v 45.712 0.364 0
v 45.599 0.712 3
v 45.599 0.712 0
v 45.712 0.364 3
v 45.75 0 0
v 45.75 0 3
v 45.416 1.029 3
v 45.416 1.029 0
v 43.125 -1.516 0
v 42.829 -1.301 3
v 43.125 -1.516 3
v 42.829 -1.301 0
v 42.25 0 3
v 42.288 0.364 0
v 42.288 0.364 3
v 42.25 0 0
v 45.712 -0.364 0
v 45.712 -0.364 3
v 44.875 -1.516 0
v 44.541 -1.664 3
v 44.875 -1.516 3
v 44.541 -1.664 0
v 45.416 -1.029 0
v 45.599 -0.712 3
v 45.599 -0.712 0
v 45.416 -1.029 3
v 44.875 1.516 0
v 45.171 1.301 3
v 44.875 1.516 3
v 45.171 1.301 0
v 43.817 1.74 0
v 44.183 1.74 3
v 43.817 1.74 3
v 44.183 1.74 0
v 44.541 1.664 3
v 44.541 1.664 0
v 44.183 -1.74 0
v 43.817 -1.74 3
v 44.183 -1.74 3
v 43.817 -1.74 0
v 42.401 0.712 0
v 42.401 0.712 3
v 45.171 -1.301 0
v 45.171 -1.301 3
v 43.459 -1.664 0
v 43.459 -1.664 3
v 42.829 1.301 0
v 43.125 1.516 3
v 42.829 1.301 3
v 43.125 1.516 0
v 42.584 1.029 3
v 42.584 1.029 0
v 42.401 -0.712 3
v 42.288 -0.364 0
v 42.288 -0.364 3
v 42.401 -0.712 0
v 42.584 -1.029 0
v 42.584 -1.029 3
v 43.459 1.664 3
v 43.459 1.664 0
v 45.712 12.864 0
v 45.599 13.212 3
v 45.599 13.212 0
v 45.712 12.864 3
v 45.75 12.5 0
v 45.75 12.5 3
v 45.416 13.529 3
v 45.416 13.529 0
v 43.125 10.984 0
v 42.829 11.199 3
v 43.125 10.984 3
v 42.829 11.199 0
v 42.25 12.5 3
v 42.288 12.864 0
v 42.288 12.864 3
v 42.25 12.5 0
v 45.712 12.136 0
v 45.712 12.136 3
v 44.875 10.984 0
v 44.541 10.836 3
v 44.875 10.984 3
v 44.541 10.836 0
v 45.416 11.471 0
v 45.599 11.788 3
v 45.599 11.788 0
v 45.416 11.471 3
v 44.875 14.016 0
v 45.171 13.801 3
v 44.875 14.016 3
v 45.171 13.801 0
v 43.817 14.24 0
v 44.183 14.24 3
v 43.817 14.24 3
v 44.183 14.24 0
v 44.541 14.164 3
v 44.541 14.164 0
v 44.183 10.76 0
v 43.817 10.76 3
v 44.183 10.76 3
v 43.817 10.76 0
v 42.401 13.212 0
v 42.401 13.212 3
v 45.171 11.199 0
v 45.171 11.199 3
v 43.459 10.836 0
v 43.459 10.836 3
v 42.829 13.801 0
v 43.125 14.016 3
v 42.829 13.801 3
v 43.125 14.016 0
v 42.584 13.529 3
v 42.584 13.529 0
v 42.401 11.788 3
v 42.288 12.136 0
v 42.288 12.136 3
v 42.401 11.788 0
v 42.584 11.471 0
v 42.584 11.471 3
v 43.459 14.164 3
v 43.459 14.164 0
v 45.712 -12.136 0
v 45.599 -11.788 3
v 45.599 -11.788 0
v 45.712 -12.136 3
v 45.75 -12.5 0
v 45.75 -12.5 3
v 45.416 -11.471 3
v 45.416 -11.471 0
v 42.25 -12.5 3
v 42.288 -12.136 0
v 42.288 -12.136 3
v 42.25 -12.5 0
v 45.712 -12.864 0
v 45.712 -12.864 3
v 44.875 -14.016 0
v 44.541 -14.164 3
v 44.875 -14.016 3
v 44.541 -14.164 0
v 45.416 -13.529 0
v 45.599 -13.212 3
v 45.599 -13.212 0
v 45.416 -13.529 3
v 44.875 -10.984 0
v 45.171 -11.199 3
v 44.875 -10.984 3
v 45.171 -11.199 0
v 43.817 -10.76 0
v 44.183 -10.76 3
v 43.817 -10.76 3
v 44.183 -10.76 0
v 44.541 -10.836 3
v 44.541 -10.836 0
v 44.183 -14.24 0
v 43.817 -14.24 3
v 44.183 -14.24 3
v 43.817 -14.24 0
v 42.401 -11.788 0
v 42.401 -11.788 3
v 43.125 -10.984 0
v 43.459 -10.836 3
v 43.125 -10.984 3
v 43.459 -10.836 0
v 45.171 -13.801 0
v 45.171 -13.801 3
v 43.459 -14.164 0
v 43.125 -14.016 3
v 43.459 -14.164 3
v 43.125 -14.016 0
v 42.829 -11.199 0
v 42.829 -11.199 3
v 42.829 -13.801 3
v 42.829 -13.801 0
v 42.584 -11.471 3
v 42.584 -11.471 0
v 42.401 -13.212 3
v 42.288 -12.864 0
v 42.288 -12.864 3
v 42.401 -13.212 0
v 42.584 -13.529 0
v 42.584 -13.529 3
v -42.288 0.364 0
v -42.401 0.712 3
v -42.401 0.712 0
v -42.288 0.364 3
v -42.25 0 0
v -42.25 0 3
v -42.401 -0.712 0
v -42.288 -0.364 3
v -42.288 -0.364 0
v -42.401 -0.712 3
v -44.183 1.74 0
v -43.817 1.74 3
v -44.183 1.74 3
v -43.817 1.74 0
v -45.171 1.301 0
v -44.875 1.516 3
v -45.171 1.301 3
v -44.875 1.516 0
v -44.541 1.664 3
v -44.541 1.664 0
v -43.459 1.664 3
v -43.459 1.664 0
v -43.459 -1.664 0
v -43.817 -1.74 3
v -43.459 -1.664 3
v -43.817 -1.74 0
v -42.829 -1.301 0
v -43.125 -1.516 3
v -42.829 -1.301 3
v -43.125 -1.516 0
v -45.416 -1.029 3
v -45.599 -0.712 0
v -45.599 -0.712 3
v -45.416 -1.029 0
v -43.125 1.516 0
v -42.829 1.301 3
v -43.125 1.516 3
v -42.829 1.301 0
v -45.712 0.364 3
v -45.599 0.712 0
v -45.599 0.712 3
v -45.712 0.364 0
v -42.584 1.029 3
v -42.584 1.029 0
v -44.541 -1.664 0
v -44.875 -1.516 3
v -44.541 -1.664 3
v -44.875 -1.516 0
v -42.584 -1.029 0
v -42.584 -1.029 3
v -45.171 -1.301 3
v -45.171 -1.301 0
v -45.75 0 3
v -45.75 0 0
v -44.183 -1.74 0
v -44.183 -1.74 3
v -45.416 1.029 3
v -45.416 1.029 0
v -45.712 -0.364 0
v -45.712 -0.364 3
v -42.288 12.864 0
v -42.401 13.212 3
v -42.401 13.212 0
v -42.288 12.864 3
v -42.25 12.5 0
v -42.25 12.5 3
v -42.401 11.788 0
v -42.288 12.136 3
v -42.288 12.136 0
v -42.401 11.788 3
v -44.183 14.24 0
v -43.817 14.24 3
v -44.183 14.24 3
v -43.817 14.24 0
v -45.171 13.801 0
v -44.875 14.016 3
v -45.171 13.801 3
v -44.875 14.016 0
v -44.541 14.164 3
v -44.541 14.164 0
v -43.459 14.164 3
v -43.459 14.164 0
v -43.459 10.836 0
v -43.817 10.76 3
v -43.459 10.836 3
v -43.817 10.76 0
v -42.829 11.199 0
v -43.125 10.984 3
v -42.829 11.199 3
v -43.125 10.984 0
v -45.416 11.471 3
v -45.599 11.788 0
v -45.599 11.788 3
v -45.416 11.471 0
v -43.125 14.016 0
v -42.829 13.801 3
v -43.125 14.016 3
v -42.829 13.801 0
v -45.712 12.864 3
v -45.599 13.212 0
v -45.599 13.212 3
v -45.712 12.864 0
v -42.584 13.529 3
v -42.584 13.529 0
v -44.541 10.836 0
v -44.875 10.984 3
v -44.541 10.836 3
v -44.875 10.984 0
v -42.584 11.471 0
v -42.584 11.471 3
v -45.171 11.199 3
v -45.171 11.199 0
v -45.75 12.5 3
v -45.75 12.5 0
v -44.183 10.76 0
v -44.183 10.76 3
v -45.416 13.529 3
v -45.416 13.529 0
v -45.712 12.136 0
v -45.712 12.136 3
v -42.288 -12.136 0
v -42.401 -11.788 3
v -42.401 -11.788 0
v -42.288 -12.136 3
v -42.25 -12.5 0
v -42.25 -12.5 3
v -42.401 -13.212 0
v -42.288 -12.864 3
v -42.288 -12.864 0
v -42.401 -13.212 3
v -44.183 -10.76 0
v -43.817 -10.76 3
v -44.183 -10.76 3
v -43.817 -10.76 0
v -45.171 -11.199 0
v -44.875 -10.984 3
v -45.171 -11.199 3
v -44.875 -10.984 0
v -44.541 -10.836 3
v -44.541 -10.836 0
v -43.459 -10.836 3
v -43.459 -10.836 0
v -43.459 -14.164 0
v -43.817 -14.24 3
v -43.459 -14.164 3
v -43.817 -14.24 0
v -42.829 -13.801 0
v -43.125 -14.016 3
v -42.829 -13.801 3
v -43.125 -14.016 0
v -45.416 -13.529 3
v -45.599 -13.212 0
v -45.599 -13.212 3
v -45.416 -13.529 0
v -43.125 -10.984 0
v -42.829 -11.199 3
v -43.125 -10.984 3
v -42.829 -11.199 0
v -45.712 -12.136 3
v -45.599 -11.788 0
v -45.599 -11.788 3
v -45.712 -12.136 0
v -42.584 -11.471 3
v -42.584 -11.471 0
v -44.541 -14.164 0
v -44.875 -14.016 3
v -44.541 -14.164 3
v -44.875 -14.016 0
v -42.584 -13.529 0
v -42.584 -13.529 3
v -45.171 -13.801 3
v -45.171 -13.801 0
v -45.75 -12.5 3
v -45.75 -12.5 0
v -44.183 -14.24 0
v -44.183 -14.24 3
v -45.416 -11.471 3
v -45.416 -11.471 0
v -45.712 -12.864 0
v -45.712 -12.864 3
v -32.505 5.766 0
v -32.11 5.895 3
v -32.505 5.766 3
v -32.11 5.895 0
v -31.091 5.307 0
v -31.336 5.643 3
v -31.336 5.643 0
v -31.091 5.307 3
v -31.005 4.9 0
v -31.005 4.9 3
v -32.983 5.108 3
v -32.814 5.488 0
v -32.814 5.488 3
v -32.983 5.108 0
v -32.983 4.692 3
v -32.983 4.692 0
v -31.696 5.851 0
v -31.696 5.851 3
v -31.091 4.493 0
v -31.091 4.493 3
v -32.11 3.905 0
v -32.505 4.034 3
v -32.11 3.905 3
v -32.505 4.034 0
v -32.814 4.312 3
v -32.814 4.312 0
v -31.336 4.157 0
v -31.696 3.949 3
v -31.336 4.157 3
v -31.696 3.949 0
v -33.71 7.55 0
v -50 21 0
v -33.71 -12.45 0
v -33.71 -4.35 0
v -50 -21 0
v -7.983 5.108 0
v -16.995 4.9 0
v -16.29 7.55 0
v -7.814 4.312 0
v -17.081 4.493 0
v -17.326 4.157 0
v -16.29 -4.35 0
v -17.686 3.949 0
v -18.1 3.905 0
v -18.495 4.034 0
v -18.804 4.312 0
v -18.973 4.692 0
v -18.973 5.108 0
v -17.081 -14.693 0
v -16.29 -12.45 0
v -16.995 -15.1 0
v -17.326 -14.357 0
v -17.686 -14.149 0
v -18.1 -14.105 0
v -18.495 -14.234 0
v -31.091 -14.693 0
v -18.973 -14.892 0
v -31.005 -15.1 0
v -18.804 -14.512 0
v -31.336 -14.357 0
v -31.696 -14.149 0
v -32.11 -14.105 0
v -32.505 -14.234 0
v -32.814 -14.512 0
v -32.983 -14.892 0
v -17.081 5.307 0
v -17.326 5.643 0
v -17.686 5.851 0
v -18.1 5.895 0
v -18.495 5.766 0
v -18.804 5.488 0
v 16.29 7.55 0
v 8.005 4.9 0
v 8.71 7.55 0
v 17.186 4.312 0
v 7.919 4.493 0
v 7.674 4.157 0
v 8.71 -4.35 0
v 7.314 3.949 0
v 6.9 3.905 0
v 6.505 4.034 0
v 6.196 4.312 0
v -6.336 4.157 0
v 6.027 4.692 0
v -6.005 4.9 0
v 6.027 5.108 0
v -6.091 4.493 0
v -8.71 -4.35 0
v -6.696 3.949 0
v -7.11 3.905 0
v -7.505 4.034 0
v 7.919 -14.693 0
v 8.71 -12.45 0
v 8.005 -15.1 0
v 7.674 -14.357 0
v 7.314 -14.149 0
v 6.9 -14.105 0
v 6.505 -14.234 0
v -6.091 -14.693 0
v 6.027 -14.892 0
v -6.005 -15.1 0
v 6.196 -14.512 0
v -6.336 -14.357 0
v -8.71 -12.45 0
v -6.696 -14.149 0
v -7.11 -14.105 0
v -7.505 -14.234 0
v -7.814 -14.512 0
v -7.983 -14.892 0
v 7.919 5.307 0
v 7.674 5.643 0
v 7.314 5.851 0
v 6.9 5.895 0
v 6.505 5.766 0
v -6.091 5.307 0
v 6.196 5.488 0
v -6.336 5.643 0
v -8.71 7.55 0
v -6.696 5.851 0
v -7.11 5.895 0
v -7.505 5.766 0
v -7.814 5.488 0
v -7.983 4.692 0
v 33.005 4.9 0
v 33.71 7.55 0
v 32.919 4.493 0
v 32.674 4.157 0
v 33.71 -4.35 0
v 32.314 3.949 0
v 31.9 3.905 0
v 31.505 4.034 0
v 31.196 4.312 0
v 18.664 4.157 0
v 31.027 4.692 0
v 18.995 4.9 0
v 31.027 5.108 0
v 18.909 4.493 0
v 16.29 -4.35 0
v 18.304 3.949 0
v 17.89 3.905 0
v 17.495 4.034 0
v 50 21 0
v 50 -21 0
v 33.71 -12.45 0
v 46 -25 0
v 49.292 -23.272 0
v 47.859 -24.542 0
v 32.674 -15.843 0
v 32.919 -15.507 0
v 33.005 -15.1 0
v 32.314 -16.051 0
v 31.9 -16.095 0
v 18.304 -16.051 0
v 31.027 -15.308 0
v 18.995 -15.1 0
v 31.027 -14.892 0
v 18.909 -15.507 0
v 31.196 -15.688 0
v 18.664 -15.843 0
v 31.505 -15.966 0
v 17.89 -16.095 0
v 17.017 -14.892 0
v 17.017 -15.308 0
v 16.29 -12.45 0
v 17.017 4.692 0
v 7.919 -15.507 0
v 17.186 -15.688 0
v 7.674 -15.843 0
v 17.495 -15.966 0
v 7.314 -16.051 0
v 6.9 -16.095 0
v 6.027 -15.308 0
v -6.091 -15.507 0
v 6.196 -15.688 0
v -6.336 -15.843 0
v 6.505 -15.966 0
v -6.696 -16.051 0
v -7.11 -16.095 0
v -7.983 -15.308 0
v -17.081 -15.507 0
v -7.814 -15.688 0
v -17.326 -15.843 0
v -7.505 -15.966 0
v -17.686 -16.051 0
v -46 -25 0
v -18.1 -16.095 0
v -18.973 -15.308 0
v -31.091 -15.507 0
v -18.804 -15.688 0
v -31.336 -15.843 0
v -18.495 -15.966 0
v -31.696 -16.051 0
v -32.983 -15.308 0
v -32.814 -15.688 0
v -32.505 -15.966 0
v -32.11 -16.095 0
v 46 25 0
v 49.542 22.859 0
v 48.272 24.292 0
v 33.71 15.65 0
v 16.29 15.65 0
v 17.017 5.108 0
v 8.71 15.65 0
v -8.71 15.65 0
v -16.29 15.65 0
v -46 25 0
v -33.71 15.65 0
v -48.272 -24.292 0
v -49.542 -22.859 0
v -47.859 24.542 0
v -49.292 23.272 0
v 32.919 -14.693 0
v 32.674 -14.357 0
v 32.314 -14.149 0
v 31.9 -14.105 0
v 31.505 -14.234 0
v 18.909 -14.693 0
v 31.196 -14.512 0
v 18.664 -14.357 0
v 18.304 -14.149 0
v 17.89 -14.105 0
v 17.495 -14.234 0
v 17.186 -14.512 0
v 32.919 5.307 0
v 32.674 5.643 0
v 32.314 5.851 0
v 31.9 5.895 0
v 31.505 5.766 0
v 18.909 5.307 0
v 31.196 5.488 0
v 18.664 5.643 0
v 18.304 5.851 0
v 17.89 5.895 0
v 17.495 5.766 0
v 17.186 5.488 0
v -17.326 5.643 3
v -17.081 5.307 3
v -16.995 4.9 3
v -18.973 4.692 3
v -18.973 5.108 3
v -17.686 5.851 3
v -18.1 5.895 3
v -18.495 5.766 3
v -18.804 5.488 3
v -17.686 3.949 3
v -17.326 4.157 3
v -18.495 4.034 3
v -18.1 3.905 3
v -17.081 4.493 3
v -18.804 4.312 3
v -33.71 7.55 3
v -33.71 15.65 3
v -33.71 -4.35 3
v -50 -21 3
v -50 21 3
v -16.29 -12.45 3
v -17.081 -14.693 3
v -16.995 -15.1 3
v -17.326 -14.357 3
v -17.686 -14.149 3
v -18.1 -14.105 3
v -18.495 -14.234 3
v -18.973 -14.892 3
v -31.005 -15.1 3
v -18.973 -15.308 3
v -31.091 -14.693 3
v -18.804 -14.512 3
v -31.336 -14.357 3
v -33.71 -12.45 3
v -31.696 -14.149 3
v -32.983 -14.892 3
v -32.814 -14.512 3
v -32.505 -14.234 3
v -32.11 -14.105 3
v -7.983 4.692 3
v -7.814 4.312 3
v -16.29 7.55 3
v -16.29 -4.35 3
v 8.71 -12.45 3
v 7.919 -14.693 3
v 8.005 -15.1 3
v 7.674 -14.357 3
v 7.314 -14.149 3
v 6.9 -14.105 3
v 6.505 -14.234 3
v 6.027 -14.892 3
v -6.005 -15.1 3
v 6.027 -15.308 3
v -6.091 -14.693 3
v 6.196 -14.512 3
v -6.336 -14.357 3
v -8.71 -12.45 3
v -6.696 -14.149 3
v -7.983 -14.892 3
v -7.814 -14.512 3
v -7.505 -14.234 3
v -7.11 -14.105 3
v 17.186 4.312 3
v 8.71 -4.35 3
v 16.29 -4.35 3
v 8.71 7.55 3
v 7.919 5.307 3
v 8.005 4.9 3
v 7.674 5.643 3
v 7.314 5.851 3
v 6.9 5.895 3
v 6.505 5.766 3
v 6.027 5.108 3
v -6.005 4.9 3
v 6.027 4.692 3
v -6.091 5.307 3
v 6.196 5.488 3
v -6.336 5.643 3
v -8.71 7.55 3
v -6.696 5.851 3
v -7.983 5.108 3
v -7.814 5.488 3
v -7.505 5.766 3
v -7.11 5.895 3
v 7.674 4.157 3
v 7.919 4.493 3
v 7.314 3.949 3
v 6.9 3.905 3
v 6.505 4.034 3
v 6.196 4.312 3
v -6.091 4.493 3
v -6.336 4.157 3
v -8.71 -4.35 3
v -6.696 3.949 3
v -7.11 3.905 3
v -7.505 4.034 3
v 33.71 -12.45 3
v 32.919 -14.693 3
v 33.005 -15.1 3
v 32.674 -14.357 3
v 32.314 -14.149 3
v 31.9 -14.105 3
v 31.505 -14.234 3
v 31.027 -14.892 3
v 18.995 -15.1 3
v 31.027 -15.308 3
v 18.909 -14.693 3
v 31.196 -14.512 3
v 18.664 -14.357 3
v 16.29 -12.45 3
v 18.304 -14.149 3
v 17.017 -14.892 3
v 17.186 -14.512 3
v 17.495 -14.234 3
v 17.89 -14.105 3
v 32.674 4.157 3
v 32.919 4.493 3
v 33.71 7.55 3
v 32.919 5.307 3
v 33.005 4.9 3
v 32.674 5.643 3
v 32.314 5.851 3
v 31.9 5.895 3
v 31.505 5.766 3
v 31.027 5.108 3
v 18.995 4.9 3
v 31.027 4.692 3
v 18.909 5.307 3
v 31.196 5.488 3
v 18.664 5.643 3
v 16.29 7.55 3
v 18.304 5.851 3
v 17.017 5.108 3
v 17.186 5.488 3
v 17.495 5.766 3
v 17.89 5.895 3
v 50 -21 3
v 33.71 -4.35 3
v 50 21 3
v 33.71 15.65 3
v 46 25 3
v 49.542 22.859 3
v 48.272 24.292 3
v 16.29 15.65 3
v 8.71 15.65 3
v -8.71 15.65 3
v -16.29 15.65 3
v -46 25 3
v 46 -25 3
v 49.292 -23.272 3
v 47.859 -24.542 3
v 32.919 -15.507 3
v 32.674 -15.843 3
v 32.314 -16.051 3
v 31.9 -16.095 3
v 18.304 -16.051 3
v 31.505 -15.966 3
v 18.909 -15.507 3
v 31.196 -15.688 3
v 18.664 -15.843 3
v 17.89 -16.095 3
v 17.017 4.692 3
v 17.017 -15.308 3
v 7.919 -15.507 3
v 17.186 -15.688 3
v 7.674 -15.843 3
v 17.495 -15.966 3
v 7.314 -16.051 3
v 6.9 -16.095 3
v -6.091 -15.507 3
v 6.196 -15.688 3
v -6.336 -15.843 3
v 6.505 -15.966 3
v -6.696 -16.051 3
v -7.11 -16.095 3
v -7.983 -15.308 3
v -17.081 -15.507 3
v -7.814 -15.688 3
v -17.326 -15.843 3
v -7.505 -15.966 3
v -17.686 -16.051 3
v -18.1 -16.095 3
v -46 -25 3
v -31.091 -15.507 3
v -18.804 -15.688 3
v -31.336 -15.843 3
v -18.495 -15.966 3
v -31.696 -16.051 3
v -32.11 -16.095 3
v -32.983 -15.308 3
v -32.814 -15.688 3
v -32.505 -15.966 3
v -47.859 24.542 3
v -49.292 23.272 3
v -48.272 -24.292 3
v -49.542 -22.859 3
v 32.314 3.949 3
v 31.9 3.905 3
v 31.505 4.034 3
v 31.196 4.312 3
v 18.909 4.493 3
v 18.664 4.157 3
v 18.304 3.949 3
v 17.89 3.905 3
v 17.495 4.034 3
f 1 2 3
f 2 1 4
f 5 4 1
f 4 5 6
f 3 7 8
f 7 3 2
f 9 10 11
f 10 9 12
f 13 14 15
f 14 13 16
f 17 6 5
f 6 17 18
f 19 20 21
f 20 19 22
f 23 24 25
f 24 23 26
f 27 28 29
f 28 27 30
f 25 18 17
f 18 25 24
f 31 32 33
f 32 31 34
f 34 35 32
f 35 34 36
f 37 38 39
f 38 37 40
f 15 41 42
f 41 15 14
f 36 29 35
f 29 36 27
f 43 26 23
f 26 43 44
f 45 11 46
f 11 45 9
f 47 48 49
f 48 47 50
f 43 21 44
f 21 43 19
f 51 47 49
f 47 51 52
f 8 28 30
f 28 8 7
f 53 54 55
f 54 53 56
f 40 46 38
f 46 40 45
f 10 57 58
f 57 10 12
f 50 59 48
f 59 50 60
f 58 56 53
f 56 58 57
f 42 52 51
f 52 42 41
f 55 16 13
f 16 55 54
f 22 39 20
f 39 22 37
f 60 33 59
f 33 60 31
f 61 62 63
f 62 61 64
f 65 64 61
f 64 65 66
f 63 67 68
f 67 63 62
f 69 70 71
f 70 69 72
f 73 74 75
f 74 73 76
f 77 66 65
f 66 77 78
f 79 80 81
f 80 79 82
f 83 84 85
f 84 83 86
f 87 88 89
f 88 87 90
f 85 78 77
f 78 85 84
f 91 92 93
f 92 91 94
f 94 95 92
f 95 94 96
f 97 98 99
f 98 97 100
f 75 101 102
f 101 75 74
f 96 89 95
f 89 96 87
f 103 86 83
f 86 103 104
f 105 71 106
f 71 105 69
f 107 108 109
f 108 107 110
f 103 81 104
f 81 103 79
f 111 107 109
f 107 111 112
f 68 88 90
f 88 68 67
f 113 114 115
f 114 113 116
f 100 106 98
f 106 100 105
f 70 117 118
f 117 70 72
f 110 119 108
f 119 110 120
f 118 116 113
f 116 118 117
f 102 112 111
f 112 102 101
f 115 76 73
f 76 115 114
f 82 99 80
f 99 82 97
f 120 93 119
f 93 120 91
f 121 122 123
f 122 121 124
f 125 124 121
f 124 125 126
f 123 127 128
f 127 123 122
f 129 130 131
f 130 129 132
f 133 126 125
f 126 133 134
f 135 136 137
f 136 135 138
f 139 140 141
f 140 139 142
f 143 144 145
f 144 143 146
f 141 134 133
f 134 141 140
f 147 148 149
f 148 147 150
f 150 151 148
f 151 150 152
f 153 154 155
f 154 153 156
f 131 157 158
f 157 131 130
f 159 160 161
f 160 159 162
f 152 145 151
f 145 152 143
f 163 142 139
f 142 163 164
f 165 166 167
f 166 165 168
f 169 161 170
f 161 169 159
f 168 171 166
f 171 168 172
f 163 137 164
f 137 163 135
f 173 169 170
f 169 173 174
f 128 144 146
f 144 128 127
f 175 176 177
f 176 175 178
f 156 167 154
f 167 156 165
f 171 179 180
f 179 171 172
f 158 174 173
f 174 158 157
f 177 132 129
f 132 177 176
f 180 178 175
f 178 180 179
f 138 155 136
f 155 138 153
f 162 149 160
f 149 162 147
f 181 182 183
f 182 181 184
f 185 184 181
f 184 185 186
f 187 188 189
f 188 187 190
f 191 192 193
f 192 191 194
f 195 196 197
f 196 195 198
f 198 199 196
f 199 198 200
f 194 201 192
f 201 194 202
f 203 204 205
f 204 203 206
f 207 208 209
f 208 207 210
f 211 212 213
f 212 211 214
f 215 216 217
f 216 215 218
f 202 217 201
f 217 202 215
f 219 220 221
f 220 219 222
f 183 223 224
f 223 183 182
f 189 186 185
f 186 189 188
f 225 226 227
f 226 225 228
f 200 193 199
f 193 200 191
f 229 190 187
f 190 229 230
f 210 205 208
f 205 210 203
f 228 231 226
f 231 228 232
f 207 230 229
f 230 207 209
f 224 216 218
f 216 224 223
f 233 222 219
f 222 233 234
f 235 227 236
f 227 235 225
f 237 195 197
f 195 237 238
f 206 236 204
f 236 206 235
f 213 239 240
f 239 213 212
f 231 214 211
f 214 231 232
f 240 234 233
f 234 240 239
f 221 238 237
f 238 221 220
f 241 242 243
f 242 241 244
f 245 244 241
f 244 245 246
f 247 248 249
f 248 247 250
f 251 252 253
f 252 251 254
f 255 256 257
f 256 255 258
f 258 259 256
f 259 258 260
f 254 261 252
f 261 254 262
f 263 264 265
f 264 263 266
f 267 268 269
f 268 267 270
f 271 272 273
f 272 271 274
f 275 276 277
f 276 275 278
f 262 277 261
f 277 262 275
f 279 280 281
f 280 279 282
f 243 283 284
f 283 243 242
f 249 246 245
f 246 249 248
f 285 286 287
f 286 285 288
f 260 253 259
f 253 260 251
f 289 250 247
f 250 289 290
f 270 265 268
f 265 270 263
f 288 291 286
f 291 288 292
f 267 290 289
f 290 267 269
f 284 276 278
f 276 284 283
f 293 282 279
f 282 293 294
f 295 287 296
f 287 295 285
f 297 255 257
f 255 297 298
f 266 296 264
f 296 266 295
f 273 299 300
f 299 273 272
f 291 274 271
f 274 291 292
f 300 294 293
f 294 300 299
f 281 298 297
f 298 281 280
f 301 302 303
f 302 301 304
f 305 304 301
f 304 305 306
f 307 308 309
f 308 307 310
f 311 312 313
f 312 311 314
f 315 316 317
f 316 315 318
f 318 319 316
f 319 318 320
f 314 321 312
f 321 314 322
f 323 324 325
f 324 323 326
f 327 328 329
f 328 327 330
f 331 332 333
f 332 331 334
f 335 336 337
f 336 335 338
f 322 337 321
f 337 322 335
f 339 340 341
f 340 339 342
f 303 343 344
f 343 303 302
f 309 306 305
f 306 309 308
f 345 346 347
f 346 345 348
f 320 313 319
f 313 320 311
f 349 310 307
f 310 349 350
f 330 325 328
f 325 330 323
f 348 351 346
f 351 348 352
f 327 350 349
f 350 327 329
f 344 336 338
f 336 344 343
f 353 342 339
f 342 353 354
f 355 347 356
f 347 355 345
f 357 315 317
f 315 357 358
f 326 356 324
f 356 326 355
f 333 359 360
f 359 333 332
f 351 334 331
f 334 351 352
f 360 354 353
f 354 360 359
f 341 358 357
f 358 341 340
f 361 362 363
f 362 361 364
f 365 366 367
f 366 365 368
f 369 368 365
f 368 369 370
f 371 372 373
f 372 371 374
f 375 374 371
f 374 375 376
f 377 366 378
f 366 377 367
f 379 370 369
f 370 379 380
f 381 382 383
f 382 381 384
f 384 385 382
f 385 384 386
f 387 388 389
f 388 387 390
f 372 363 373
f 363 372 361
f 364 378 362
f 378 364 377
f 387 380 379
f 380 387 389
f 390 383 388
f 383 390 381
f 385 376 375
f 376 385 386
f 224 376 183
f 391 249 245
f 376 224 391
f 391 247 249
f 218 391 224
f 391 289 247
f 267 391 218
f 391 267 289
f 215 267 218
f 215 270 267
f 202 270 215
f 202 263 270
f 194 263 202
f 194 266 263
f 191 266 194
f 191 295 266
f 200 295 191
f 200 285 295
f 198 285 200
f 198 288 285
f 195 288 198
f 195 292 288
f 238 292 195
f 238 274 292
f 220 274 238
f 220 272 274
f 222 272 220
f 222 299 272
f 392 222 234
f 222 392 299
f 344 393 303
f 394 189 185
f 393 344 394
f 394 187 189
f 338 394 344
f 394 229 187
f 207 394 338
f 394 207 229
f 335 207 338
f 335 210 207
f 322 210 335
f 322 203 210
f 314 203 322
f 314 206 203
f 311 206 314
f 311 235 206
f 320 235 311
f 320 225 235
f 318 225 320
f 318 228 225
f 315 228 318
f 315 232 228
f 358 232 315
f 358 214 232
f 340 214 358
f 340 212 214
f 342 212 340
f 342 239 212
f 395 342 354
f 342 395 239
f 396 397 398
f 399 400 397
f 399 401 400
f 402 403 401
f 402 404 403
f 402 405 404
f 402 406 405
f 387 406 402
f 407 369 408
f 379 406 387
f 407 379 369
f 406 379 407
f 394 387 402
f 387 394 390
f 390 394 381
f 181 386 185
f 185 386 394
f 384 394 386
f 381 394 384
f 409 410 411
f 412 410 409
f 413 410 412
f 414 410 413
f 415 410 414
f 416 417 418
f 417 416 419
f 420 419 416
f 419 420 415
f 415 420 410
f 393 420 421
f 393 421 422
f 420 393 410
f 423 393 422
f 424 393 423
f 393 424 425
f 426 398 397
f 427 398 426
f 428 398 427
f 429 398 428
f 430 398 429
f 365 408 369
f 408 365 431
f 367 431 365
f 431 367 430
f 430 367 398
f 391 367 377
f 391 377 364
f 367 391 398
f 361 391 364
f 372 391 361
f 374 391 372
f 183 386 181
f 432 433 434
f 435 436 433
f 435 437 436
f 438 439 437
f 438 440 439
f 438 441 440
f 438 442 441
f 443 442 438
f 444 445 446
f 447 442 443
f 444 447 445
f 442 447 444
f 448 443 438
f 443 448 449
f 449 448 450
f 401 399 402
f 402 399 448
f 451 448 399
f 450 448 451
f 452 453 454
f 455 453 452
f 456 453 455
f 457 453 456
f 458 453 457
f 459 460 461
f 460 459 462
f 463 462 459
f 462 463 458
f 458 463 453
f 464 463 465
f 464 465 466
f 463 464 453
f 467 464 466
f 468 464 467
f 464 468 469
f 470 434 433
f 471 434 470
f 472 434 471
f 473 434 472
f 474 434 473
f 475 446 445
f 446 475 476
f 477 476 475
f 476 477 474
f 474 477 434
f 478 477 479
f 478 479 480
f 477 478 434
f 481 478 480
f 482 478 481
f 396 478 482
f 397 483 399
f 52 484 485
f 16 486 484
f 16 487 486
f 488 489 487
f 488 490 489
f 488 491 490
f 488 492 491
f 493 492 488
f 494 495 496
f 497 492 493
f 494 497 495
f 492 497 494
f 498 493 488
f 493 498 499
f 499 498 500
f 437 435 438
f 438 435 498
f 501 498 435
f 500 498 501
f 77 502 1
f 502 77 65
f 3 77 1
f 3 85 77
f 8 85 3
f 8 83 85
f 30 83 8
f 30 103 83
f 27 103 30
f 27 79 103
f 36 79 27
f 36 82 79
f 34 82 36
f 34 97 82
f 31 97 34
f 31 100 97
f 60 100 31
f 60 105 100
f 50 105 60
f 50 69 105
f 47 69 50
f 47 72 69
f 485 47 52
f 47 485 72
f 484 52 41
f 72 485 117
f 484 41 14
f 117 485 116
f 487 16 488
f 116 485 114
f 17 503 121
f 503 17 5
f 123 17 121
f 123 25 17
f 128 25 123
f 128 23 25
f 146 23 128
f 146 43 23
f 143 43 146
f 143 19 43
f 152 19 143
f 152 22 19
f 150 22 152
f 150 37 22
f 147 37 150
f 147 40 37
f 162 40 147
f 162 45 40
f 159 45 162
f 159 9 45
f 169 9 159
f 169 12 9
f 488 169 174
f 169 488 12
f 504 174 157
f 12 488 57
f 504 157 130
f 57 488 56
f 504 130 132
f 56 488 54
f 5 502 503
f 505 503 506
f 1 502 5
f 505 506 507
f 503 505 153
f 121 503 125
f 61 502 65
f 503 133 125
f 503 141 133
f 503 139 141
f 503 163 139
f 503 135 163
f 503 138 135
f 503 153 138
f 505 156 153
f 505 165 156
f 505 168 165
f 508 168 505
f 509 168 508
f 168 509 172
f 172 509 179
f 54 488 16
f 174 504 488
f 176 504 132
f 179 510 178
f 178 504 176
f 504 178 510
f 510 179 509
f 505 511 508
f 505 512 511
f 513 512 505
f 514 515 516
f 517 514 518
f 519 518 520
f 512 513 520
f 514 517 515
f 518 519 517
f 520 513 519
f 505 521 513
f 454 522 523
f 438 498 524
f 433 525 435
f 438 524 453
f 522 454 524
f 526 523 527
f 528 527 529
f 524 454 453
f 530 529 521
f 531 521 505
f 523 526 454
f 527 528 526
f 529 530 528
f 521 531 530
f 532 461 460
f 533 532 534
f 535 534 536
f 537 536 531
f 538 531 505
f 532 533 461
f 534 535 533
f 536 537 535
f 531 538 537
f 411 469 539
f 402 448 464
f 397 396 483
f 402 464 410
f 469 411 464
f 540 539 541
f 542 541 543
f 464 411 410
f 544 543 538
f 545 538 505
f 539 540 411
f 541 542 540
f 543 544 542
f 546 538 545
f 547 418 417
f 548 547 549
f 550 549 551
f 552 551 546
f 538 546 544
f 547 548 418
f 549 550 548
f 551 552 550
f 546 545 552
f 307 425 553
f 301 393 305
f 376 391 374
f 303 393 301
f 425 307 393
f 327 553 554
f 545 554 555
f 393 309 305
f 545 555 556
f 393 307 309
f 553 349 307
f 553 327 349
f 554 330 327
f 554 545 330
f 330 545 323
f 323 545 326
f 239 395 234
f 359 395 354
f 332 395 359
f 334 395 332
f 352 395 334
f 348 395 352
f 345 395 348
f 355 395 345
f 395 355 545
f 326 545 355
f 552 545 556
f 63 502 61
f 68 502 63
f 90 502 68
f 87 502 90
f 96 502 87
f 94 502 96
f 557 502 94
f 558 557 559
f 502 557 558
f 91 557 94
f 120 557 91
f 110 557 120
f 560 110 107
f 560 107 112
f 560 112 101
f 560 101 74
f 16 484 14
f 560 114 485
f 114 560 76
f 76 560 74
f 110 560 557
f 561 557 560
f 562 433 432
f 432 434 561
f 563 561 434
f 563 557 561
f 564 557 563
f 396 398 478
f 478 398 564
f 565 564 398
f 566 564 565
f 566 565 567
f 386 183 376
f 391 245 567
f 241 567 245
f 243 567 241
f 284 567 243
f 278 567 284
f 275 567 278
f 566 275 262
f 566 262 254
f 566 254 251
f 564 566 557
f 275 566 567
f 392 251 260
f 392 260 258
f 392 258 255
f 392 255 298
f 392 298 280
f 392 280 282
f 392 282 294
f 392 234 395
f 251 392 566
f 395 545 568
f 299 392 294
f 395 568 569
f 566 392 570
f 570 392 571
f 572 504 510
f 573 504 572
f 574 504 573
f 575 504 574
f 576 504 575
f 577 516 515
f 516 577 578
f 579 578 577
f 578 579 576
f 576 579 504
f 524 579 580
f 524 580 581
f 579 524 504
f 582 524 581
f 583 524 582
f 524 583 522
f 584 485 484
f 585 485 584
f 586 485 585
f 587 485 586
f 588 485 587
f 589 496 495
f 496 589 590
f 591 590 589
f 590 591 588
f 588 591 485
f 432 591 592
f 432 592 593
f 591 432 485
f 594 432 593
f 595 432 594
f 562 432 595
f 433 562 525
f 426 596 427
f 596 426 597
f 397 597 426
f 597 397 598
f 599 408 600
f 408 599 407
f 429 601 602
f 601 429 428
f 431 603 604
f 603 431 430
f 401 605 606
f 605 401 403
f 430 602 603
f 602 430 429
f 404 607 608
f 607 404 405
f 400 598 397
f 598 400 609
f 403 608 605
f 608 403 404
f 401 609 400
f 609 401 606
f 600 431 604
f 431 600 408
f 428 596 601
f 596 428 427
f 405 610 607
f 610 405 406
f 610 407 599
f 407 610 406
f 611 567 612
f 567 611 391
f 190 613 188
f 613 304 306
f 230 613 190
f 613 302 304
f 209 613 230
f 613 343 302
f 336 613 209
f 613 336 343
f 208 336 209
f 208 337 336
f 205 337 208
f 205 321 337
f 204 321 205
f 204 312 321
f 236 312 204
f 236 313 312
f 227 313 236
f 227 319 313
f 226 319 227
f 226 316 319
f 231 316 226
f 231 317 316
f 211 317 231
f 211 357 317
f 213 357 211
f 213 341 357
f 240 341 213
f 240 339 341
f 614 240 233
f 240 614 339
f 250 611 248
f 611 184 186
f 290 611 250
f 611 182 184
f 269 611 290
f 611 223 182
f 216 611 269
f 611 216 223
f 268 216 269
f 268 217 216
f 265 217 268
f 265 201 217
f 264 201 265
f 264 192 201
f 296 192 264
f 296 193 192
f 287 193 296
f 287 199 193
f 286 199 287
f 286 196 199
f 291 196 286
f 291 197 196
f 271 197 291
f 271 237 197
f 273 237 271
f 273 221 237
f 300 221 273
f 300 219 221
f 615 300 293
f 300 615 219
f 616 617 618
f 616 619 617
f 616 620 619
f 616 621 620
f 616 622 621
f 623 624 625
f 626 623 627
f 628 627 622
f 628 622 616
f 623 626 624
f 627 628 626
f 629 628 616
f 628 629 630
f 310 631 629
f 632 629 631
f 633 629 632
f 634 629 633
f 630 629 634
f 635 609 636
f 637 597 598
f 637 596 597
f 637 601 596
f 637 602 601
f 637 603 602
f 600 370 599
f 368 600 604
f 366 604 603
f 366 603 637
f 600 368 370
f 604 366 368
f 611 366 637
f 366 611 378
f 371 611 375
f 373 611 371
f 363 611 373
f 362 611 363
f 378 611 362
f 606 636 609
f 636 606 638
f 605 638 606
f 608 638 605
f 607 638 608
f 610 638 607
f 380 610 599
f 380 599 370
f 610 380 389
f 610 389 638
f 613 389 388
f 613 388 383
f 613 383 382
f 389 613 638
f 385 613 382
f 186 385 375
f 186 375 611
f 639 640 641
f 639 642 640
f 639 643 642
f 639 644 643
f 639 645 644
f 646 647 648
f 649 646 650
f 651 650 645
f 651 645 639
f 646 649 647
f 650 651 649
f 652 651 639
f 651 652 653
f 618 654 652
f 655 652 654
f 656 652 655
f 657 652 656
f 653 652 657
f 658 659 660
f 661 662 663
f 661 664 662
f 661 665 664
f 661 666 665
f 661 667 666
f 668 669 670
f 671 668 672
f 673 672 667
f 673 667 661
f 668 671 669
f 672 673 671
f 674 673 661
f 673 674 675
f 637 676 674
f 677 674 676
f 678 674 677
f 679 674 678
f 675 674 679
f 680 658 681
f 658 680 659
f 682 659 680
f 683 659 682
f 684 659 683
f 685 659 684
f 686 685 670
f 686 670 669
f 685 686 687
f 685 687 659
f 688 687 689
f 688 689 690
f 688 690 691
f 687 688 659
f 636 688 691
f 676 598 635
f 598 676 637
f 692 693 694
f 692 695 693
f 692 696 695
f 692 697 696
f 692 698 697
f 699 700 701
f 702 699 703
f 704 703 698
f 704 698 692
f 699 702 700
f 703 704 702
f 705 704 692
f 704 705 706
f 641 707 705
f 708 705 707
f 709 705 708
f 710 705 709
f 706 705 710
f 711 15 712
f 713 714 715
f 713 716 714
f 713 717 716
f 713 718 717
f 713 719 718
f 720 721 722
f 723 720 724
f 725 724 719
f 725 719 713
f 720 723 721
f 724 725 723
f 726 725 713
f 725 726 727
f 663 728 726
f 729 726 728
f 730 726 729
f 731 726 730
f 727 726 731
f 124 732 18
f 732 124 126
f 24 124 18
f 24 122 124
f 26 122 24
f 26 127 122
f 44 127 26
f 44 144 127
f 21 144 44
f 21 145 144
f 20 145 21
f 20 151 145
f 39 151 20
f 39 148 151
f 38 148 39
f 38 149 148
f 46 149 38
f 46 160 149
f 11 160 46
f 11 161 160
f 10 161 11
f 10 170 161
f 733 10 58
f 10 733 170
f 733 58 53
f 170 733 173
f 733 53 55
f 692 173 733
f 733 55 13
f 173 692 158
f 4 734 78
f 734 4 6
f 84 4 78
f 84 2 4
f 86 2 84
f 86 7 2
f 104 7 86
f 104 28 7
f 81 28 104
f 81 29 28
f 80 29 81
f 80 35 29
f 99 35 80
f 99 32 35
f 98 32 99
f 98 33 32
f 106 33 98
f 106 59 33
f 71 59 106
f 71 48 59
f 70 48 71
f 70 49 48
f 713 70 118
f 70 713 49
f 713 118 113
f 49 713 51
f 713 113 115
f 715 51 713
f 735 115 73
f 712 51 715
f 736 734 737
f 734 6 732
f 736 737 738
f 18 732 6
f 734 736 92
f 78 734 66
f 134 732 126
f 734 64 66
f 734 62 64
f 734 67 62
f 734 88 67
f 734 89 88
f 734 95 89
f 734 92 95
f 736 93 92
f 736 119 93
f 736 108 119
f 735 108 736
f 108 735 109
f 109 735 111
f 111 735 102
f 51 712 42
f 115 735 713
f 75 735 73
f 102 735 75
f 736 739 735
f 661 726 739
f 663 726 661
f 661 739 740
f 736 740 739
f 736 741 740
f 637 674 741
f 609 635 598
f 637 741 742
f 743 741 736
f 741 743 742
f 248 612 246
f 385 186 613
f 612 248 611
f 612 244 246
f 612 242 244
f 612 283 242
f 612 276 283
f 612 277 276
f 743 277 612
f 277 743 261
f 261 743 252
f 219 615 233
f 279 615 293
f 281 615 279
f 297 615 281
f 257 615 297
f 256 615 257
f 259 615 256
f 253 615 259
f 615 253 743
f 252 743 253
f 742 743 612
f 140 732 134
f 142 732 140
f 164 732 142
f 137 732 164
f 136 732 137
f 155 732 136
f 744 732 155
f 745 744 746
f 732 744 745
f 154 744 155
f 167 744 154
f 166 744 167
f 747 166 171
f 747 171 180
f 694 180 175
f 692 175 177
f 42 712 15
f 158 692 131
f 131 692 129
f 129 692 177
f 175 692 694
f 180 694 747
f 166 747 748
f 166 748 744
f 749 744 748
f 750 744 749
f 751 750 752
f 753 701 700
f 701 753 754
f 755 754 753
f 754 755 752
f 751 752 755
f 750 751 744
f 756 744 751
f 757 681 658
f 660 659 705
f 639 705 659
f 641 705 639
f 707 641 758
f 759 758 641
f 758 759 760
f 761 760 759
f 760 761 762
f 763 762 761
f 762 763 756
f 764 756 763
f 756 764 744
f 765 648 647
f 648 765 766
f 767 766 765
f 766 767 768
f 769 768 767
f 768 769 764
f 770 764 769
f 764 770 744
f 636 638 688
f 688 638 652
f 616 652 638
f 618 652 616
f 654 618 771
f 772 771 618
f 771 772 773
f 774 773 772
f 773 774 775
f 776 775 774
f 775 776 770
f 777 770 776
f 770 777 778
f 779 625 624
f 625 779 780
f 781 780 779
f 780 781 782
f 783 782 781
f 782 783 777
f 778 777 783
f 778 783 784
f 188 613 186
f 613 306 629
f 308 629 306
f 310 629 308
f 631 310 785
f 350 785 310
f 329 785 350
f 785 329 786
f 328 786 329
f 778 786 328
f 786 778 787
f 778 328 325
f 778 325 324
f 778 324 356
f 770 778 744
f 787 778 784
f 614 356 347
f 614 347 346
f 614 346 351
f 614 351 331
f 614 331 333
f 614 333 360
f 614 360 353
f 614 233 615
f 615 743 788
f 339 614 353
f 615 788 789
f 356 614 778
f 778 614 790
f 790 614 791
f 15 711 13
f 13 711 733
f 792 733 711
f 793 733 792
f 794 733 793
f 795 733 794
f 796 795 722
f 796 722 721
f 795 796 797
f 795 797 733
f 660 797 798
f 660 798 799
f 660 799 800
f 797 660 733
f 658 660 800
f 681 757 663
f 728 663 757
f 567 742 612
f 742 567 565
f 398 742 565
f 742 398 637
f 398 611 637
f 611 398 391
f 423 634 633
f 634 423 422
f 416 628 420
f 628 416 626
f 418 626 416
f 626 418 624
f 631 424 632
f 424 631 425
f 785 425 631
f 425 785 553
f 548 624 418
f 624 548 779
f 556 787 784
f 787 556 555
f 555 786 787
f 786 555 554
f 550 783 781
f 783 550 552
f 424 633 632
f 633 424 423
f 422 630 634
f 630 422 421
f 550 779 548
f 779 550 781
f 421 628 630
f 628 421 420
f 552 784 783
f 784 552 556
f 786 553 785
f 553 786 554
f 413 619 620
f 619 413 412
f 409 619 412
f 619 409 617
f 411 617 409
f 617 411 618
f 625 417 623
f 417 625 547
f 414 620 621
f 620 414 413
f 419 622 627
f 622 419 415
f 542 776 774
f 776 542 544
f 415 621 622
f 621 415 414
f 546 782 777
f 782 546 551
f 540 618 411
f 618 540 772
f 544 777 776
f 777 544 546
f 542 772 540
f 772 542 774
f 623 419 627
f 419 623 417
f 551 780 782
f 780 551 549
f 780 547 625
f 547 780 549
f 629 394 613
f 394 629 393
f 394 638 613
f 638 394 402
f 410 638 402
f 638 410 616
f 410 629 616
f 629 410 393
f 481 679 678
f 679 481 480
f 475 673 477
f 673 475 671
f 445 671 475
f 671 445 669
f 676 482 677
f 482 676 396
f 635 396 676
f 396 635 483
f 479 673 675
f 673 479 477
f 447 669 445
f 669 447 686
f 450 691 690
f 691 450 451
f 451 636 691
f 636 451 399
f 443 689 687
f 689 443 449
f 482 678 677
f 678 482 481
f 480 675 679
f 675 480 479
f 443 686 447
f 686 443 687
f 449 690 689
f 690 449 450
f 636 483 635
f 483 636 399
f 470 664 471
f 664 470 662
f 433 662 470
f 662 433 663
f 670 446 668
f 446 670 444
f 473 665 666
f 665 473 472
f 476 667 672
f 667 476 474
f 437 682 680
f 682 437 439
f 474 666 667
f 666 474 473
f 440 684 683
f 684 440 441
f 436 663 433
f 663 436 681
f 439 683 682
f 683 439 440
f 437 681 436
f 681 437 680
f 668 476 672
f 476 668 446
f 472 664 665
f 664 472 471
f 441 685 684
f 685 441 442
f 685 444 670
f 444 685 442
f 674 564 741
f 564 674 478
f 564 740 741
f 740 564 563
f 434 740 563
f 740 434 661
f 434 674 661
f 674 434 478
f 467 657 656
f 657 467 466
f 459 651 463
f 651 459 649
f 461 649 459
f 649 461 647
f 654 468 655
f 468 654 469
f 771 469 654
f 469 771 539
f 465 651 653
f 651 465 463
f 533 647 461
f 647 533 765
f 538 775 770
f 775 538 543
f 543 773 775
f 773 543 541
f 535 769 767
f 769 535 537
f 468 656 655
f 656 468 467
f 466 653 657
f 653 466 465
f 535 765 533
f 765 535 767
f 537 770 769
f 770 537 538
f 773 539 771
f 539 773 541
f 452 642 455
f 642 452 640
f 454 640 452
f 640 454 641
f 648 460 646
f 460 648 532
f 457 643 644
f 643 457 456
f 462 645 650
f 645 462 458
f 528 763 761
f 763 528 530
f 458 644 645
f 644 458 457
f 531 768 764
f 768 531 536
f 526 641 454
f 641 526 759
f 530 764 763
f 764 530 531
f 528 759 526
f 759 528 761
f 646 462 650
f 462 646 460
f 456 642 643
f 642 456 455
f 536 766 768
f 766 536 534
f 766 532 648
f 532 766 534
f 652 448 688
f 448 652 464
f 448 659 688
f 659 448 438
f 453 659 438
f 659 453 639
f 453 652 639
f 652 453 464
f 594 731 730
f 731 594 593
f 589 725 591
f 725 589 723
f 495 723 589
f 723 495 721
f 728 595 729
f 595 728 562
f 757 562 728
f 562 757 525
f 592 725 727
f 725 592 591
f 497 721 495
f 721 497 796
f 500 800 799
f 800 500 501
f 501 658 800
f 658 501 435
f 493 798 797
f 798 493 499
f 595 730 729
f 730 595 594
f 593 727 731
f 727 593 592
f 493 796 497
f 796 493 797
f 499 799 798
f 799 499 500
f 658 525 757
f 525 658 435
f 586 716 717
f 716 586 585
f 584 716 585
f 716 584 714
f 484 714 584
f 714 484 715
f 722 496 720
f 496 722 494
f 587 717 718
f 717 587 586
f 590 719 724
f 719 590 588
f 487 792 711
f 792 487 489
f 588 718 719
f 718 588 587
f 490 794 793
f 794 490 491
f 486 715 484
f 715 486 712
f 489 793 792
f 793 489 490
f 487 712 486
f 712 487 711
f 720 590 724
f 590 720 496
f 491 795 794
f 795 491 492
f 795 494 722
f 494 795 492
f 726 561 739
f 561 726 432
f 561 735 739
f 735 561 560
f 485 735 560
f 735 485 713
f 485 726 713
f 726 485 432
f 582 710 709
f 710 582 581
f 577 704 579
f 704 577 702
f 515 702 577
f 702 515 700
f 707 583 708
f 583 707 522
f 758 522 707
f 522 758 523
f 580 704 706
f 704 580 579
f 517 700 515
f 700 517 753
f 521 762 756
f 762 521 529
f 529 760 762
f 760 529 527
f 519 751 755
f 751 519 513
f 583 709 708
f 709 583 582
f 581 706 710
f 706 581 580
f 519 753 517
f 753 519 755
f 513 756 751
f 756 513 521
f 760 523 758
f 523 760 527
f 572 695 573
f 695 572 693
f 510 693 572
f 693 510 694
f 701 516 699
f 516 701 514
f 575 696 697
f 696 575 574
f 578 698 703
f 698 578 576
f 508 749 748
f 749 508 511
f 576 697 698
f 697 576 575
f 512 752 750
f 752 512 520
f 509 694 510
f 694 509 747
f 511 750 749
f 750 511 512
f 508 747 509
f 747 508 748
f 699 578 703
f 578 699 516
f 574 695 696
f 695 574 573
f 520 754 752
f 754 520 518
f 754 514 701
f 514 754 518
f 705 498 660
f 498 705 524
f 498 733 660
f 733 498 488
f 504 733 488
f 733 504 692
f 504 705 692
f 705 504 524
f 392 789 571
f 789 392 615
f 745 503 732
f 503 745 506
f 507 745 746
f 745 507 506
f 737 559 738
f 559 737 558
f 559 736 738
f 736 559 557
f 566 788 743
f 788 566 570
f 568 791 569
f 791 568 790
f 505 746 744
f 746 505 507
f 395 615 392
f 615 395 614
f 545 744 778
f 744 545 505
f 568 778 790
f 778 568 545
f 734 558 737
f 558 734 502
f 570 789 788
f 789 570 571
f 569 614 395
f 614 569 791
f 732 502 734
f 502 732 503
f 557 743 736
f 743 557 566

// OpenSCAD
// Main box
BOX_W = 100;      // width  (X)
BOX_L = 50;     // length (Y)
BOX_H = 3;    
BOX_R = 4;
HOLE_PADDING = 6;
HOLE_DIAM = 4.5;
HOLE_FN = 30;

CONNECTOR_PINS = 2;


// Main plate with rounded corners
difference(){
    linear_extrude(BOX_H)
        offset(r = BOX_R) 
            offset(r = -BOX_R) 
                square([BOX_W, BOX_L], center = true);
                
             
    mounting_holes(BOX_W,HOLE_PADDING);
    ROW1 = 5;
    ROW2 = -15;
    connector(-25,ROW1,CONNECTOR_PINS);
    connector(-25,ROW2,CONNECTOR_PINS);

    connector(0,ROW1,CONNECTOR_PINS);
    connector(0,ROW2,CONNECTOR_PINS);
    
    connector(25,ROW1,CONNECTOR_PINS);
    connector(25,ROW2,CONNECTOR_PINS);

    
}

module connector(posX,posY,pins){
    connector_holes(posX,posY,pins);
    connector_body(posX,posY,pins);
}




module connector_holes(xPos,yPos,pins){
    X = xPos;
    Y = yPos;
    //holes_between = 3.81*pins+6.19;
    holes_between = 3.81 * (pins-1)+10+0.2;
    
    translate( [X - holes_between/2, Y -0.1] )
        hole_M2();

    translate( [X + holes_between/2, Y -0.1] )
        hole_M2();
}



module connector_body(xPos, yPos,pins) {
    body_w = pins * 3.81 + 9.8;   // total width of the plastic body
    body_l = 8.1;             // depth of the body (Y direction)
    
    y = yPos + 2.55 + body_l/2;
    
    translate([xPos, y, 0])
        linear_extrude(BOX_H)
            translate([-body_w/2, -body_l/2, -0.1])
                square([body_w, body_l]);
}



module mounting_holes(w,padding){
    // Right side
    translate([ w/2 - padding,  0, -0.1]) 
    hole_M3();
    
    translate([ w/2 - padding,  25/2, -0.1]) 
    hole_M3();

    translate([ w/2 - padding, 0- 25/2, -0.1]) 
    hole_M3();

    // Left side holes
    translate([ 0- w/2 + padding,  0, -0.1]) 
    hole_M3();
    
    translate([0- w/2 + padding,  25/2, -0.1]) 
    hole_M3();

    translate([0- w/2 + padding, 0- 25/2, -0.1]) 
    hole_M3();

    
}


module hole_M2(){
    cylinder(h = BOX_H + 0.2, d = 2, $fn=15);
}


module hole_M3(){
    cylinder(h = BOX_H + 0.2, d = 3.5, $fn=HOLE_FN);
}
